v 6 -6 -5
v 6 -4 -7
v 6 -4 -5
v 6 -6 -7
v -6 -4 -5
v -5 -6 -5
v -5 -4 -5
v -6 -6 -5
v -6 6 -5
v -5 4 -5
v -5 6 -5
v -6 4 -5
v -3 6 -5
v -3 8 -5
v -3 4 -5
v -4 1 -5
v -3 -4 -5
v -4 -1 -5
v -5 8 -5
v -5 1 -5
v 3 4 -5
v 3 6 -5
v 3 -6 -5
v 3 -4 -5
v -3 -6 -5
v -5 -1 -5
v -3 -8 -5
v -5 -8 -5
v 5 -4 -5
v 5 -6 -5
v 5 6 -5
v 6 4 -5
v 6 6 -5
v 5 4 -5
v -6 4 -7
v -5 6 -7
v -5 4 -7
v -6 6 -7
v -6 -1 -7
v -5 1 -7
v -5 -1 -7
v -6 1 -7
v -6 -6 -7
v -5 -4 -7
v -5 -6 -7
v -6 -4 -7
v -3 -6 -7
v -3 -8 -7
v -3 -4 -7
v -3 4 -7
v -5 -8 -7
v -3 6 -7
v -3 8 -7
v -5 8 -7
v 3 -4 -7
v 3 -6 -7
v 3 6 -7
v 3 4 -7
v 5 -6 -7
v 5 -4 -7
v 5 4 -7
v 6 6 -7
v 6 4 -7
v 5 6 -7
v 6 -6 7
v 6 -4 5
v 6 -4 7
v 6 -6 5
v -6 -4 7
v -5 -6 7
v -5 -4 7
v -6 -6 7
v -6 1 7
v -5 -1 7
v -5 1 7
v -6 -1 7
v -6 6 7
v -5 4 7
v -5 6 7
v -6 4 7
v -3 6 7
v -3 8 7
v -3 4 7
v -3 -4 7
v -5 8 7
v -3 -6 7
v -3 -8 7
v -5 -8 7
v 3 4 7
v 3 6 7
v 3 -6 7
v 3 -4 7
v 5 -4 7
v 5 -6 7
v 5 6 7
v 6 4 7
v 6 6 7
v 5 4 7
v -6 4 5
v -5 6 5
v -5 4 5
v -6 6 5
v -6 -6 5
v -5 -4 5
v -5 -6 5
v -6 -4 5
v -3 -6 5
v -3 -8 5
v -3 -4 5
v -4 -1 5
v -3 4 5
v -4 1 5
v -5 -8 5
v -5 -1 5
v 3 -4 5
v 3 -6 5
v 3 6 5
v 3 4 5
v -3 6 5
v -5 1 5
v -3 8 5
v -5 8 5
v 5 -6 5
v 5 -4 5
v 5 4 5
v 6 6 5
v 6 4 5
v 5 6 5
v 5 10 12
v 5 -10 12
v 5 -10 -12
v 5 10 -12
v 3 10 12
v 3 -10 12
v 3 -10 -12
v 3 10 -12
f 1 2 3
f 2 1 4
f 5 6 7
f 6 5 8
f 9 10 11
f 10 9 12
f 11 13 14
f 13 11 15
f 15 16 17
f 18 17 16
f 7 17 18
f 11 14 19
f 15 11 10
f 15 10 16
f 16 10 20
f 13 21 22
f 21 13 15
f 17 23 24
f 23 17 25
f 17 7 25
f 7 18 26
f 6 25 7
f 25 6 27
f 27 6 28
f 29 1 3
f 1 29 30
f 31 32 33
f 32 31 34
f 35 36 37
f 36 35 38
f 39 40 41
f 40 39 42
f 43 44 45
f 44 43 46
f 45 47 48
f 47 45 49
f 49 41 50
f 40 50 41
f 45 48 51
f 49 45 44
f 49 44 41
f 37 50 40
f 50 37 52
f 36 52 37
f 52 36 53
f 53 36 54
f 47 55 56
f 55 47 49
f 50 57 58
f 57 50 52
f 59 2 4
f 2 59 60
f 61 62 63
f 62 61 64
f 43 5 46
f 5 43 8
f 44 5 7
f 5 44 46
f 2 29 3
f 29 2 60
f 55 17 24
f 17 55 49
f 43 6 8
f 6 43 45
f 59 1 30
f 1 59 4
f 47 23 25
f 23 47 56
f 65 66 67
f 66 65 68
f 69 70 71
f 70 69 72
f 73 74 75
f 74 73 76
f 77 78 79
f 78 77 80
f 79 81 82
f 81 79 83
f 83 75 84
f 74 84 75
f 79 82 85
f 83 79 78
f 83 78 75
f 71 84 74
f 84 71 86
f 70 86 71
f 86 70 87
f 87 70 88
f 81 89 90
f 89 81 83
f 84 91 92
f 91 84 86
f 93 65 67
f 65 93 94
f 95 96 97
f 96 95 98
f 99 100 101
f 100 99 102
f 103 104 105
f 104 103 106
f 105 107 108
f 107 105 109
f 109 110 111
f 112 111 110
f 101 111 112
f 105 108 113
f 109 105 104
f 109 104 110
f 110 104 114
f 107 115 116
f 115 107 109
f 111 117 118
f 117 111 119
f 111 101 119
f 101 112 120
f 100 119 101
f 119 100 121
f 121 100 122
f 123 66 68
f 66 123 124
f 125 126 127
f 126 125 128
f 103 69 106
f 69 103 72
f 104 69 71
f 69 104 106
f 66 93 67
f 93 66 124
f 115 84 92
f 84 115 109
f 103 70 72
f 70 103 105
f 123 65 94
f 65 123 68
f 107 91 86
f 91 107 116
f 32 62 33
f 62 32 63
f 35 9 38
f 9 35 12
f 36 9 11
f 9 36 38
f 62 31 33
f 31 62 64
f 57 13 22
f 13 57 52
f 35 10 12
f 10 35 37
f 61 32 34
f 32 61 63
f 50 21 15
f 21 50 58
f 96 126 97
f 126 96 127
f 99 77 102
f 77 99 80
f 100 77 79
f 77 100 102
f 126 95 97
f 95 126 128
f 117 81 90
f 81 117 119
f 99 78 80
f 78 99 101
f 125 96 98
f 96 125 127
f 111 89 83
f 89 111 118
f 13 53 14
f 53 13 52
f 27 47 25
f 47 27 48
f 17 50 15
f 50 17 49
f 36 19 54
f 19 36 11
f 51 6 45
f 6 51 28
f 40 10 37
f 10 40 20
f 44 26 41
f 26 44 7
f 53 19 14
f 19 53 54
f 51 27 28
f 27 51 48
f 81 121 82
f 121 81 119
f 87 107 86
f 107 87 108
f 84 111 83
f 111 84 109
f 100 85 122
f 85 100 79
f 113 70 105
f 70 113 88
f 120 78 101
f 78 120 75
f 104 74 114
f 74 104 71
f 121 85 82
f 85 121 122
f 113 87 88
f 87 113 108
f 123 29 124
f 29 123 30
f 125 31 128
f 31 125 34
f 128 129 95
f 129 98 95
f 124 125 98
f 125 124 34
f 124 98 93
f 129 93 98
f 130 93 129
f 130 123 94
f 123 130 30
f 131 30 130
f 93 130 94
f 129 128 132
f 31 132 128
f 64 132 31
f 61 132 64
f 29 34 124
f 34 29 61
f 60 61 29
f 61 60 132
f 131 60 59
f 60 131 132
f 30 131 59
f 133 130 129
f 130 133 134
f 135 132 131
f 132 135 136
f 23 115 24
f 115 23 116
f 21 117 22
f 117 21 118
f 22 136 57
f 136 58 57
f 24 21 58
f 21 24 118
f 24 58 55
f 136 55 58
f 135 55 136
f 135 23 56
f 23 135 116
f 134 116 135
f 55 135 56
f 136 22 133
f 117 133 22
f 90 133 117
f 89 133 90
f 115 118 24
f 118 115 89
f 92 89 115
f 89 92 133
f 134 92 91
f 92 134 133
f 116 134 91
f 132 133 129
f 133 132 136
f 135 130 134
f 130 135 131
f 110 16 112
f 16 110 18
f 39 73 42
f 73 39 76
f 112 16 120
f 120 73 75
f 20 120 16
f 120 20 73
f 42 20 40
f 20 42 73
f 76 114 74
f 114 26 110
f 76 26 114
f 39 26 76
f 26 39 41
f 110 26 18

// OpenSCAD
//draw('Top','Rect',P=(4,0,0),G=(2,10,12))

translate([4,0,0]) {
    cube([2,20,24],true);
}

//for(i<2,'Trans',u1=(0,0,12))
//for(j<2,'Trans',u2=(0,10,0))
//draw('Leg','Cub',P=(-6,-6,-7)
//+(j×u2)+(i×u1),G=(12,2,2))

translate([-6,-6,-7]) {
    cube([12,2,2]);
    translate([0,0,12]) {
        cube([12,2,2]);
    }
    translate([0,10,0]) {
        cube([12,2,2]);
    }
    translate([0,10,12]) {
        cube([12,2,2]);
    }
}

//for(i<2,'Trans',u=(0,0,12))
//draw('HoriBar','Cub',P=(-5,-8,-7)
//+(i×u),G=(2,16,2))

translate([-5,-8,-7]) {
    cube([2,16,2]);
    translate([0,0,12]) {
        cube([2,16,2]);
    }
}

//draw('HoriBar','Cub',P=(-6,-1,-7),G=(2,2,14))

translate([-6,-1,-7]) {
    cube([2,2,14]);
}
